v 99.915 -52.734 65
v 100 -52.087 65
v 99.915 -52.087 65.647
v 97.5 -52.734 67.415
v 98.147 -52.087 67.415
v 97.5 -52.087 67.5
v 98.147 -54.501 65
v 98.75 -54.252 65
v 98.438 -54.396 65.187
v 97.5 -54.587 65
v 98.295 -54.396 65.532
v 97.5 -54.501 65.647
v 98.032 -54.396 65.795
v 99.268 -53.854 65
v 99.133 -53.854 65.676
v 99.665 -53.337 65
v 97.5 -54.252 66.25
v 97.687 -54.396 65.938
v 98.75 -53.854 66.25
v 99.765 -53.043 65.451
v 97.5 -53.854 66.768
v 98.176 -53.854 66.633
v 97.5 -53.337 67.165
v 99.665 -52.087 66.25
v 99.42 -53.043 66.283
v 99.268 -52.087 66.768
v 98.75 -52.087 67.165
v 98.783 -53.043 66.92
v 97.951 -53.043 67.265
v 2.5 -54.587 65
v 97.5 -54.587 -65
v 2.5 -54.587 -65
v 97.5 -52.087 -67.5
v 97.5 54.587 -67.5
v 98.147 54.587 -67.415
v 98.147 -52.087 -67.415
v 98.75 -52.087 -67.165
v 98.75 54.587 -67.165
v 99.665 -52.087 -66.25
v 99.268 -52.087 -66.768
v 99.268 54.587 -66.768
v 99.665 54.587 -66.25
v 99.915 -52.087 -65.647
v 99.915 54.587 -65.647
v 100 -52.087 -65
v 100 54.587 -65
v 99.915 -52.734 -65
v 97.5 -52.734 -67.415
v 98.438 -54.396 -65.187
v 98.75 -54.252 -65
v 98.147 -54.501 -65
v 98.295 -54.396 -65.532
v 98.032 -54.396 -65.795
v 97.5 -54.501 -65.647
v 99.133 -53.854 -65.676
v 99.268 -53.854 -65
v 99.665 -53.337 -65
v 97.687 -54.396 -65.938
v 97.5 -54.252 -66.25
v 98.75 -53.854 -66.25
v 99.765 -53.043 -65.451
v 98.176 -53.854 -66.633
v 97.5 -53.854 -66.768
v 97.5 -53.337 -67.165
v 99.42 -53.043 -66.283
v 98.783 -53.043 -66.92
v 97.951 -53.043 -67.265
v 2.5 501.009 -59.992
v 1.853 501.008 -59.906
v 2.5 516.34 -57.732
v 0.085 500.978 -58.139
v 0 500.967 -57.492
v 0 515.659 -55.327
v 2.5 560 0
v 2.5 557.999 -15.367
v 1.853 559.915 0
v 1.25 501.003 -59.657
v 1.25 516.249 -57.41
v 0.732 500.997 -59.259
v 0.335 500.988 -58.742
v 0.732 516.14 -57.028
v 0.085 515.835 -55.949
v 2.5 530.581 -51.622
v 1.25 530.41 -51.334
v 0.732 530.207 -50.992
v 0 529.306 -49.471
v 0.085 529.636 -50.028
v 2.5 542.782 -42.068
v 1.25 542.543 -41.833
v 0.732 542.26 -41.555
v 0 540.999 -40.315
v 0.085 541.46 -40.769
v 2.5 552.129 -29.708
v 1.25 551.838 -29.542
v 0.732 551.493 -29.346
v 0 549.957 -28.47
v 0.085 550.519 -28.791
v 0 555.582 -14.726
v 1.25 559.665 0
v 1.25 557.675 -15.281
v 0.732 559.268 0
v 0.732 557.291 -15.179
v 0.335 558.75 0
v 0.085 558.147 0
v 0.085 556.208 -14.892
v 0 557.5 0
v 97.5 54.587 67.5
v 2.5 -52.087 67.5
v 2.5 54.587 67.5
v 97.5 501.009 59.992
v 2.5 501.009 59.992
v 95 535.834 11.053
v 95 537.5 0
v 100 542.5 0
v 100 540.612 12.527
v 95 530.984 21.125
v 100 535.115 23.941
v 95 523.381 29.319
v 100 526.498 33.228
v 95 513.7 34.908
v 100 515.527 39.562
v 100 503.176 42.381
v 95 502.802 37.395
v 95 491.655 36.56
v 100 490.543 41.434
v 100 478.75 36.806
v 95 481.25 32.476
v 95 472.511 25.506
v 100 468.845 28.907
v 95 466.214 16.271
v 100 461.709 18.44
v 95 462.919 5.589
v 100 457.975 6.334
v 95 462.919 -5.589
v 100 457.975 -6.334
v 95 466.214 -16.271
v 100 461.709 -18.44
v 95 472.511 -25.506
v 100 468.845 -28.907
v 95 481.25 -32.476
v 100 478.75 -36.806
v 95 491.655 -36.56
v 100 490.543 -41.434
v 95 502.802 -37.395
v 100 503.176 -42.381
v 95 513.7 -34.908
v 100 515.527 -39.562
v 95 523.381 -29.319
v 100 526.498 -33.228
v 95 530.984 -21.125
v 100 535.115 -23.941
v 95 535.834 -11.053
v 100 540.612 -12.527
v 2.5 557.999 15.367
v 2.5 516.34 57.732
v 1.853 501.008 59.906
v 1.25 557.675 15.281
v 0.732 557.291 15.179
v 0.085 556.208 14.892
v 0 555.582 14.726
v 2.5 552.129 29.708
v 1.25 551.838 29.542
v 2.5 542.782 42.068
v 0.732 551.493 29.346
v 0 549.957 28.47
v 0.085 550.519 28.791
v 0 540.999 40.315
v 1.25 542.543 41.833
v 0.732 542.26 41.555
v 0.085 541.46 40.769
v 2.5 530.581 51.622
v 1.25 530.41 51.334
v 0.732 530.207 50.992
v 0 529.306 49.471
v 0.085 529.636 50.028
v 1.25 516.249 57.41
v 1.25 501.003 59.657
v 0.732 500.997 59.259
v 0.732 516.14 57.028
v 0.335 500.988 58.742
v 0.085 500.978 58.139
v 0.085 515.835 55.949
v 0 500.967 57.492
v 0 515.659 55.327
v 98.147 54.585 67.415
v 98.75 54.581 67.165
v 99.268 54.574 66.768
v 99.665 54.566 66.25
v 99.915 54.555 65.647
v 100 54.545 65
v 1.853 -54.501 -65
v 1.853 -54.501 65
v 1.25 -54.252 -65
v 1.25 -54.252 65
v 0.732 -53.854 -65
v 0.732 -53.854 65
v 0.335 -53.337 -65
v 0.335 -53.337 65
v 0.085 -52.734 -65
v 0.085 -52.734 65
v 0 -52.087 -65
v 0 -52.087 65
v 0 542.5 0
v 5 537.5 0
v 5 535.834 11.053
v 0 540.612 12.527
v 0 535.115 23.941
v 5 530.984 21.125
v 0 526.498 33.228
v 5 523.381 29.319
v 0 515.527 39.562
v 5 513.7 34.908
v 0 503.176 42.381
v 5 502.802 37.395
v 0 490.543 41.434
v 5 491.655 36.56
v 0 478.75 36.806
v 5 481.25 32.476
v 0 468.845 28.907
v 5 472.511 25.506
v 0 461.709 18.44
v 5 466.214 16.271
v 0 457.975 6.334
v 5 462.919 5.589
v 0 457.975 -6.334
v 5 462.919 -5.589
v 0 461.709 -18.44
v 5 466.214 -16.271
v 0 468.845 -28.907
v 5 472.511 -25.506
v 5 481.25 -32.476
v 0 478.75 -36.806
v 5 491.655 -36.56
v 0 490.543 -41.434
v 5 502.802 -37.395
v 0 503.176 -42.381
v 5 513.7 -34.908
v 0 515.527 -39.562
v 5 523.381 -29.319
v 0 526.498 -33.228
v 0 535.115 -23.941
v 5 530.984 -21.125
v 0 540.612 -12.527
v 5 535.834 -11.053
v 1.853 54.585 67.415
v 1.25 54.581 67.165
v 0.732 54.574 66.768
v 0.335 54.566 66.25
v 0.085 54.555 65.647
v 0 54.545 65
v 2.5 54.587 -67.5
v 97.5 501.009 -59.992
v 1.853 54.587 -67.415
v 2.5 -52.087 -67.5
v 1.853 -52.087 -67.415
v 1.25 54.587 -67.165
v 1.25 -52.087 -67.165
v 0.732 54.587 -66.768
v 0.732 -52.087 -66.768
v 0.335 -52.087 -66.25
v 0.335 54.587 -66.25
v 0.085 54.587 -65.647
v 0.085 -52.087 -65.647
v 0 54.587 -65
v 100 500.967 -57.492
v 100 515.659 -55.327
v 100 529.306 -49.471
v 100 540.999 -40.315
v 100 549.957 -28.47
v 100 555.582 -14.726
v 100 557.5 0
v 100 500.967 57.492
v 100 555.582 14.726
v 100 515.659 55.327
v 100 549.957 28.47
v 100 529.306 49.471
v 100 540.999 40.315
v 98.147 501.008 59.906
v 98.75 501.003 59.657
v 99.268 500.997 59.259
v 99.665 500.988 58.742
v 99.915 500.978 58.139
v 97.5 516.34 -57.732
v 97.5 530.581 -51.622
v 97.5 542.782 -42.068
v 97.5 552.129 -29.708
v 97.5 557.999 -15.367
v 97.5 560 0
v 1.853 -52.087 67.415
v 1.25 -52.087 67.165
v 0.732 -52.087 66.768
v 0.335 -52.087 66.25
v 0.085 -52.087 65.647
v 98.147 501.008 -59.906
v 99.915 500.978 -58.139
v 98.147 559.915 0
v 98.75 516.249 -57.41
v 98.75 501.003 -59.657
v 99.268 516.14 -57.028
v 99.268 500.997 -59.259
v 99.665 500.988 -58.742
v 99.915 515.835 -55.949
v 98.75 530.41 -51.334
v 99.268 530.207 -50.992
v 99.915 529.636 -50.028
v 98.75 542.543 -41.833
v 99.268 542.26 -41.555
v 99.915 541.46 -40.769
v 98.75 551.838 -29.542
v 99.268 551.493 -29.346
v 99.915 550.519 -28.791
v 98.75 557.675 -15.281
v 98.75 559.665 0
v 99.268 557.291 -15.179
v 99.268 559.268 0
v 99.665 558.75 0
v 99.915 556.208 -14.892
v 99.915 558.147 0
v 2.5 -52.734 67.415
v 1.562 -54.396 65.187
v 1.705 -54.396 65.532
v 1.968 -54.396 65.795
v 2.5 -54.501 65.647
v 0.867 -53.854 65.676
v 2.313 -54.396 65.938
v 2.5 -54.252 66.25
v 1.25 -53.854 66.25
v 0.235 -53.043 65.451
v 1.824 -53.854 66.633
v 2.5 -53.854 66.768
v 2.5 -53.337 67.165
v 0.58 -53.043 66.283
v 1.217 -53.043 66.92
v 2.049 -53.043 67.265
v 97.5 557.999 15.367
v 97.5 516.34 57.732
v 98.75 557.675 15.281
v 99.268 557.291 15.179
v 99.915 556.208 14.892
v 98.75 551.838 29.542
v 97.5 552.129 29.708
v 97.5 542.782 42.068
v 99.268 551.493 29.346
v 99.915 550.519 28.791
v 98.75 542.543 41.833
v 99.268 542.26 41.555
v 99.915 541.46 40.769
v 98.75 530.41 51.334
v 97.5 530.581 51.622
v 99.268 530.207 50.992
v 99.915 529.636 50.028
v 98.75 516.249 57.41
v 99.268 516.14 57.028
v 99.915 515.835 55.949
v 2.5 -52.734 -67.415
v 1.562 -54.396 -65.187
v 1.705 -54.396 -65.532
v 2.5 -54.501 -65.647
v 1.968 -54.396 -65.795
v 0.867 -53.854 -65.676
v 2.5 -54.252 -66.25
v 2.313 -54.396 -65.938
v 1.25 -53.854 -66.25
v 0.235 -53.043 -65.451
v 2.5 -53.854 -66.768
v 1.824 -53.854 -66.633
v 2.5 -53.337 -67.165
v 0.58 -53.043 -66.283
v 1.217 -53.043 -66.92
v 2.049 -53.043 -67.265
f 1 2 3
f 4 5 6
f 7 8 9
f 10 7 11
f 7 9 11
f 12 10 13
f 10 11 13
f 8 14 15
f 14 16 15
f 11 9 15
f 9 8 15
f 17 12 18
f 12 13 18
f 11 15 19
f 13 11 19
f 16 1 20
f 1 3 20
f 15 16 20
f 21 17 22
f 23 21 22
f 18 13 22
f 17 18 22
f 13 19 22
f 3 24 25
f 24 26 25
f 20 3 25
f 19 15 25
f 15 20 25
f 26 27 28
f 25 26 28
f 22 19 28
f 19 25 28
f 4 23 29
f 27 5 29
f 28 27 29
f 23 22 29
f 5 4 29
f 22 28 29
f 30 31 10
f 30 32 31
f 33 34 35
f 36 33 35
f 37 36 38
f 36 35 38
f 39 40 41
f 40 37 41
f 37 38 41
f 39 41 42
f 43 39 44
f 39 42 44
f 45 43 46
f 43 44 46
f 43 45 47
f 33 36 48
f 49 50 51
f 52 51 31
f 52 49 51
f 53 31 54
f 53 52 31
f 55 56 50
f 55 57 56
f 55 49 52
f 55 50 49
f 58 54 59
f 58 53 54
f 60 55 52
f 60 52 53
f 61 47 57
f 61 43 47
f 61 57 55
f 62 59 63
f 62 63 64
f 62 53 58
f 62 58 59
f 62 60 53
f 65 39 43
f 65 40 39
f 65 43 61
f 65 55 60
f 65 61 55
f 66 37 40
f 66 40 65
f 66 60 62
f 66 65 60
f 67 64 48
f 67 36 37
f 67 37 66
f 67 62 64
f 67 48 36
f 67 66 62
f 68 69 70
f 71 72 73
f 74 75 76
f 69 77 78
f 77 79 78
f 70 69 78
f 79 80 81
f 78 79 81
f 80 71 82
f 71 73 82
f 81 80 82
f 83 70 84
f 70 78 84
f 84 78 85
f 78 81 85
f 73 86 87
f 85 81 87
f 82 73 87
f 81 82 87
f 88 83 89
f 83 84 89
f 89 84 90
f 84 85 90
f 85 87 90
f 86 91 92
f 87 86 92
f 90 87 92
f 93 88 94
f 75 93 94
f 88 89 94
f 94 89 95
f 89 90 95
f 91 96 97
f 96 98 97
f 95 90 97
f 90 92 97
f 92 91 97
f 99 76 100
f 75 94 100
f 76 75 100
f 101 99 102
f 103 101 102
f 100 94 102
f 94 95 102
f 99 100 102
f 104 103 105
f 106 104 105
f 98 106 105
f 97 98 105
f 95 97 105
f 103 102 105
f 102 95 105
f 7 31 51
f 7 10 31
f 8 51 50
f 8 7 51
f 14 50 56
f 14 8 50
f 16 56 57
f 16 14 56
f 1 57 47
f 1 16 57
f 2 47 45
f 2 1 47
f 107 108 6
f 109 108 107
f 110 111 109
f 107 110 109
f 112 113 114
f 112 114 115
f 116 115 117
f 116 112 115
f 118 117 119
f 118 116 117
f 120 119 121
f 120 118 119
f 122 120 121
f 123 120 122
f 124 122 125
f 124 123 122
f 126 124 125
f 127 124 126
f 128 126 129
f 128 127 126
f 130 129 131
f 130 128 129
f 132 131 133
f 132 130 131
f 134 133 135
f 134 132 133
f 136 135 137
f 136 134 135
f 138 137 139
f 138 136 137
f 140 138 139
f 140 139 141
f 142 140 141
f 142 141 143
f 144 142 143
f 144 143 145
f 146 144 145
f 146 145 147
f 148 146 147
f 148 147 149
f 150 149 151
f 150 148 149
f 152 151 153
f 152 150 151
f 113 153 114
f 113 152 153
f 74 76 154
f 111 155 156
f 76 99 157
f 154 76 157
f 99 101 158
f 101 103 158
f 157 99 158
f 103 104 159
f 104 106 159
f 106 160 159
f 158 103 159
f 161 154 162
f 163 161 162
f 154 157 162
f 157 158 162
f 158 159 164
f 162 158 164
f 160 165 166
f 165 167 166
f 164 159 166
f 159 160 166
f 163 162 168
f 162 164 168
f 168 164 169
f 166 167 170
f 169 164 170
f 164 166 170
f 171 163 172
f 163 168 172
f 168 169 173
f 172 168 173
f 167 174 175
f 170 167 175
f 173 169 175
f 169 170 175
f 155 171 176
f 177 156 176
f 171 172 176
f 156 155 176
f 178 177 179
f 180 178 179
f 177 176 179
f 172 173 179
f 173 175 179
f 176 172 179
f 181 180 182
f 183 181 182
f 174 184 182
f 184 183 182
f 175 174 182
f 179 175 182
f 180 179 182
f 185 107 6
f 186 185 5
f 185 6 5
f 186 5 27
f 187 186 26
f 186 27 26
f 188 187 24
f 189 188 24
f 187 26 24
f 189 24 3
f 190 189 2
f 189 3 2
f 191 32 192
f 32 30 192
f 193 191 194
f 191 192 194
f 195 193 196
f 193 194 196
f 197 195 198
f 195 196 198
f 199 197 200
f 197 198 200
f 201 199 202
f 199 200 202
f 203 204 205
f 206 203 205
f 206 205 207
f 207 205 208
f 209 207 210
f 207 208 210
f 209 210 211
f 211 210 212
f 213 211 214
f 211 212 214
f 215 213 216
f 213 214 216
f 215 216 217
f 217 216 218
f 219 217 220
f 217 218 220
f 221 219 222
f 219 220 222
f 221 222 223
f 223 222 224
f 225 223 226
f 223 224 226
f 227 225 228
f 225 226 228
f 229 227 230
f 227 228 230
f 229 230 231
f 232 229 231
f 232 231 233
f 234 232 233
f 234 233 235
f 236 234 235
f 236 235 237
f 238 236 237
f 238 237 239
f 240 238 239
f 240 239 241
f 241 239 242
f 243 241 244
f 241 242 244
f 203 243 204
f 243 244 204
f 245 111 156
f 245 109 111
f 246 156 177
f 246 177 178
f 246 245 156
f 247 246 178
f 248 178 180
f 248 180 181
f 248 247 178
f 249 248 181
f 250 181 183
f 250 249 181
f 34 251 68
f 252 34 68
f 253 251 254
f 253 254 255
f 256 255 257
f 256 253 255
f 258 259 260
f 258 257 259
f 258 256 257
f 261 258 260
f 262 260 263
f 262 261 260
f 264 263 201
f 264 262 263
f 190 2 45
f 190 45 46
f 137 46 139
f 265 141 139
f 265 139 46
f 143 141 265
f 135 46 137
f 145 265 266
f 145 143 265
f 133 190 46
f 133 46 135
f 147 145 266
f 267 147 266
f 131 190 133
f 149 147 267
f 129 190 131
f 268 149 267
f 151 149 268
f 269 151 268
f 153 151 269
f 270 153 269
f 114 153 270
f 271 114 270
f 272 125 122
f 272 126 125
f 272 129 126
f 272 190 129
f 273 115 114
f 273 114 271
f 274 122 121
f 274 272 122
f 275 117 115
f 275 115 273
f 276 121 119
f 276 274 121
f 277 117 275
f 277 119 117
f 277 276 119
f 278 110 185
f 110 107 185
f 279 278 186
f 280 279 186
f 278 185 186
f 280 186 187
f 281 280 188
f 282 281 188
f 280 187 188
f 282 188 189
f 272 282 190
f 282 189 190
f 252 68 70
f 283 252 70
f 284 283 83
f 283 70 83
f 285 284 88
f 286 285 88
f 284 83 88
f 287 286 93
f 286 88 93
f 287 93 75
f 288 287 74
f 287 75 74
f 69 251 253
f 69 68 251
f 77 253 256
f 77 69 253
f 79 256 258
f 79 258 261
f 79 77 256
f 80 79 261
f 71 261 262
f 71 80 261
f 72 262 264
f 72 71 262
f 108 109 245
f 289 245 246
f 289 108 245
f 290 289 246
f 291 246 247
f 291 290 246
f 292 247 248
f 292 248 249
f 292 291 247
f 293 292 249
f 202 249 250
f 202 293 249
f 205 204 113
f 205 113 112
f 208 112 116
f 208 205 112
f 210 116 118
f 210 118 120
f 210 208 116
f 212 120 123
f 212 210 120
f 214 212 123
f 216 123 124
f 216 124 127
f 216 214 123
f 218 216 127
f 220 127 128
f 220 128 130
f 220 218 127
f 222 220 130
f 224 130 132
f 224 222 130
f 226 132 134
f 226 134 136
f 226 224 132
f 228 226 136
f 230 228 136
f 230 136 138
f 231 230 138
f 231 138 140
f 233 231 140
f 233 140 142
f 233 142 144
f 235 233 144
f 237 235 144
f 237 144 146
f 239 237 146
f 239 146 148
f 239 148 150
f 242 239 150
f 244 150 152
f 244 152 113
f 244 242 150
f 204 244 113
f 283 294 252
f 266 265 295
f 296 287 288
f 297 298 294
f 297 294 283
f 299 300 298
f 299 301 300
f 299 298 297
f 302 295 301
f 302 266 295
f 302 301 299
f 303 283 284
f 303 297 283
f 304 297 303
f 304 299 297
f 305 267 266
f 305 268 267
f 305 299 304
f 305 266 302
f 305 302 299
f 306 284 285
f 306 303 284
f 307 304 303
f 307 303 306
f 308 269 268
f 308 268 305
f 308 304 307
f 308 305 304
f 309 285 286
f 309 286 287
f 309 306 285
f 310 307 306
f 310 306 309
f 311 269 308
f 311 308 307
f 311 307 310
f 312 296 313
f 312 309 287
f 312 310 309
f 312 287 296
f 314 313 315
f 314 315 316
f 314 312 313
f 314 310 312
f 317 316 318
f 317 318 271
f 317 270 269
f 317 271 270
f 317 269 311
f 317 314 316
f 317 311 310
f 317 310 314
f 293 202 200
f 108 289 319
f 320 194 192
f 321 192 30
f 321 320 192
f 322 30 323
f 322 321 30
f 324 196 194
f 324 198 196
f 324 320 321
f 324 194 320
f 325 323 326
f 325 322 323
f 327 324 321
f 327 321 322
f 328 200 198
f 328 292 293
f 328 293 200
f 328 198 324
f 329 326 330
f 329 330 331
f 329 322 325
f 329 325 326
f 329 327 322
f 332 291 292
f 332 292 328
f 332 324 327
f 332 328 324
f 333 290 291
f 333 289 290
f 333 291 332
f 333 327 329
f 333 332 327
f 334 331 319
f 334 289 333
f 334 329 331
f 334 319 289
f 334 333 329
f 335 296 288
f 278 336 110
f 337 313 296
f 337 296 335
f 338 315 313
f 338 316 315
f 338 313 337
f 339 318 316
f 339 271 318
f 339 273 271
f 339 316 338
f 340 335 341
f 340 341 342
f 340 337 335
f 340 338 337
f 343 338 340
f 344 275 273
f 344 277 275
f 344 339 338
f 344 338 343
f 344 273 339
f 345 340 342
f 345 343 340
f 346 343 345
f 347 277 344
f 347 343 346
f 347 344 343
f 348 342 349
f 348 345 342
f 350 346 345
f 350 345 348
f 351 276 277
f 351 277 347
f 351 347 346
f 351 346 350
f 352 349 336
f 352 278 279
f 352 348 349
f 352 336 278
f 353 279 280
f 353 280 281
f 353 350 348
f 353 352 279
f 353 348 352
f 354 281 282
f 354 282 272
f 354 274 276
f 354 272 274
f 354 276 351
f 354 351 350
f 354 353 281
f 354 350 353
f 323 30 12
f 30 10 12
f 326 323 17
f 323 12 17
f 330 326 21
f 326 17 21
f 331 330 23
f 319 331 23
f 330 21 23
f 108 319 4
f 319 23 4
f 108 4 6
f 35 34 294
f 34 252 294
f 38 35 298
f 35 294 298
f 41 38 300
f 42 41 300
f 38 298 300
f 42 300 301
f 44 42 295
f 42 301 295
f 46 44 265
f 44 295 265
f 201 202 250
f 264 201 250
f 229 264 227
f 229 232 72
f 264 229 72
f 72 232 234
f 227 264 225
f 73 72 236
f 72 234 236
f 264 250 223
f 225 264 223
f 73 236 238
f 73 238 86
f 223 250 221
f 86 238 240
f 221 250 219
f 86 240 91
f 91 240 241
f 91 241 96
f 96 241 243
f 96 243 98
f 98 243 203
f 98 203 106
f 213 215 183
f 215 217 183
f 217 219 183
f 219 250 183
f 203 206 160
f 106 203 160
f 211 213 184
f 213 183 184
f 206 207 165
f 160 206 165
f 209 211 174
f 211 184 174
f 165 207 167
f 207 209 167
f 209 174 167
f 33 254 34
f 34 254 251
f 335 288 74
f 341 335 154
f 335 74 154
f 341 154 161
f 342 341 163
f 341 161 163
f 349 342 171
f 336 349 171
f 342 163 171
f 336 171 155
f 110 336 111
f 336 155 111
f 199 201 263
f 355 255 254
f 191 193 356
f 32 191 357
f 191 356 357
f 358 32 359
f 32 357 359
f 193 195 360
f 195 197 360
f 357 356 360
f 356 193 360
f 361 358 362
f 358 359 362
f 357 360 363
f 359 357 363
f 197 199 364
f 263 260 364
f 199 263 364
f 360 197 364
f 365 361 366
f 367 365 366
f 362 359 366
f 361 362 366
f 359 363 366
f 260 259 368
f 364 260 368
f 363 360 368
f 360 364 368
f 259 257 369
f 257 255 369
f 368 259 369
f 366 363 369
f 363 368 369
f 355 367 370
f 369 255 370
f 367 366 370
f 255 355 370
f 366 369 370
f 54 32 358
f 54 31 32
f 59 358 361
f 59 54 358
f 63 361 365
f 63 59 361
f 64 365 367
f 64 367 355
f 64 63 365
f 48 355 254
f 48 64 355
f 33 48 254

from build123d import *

# Parameters (mm, degrees)
F0_W     = 109.173186
F0_H     = 135
F0_R     = 37.5
F1_DEPTH = 100
F2_R     = 2.5
F3_SIZE  = 5


with BuildPart() as f1:
    # F0 (on Right) → F1 (new body)
    with BuildSketch(Plane.YZ):
        Rectangle(F0_W, F0_H)
        with BuildLine():
            Line((501.009012, 59.991515), (54.586593, 67.5))
            Line((54.586593, 67.5), (54.586593, -67.5))
            Line((54.586593, -67.5), (501.009012, -59.991515))
            ThreePointArc((501.009012, -59.991515), (440, 0), (501.009012, 59.991515))
        make_face()
        with BuildLine():
            ThreePointArc((560, 0), (542.781659, 42.068155), (501.009012, 59.991515))
            ThreePointArc((501.009012, 59.991515), (440, 0), (501.009012, -59.991515))
            ThreePointArc((501.009012, -59.991515), (542.781659, -42.068155), (560, 0))
        make_face()
        with Locations((500, 0)):
            Circle(F0_R, mode=Mode.SUBTRACT)
    extrude(amount=F1_DEPTH)

    # F2
    f2_edges = [f1.edges().sort_by_distance(p)[0] for p in [
        (100, 277.797802, 63.745758),
        (100, 277.797802, -63.745758),
        (100, 0, -67.5),
        (100, -54.586593, 0),
        (100, 0, 67.5),
        (100, 560, 0),
        (0, 277.797802, 63.745758),
        (0, 560, 0),
        (0, 277.797802, -63.745758),
        (0, 0, -67.5),
        (0, -54.586593, 0),
        (0, 0, 67.5),
        (50, -54.586593, -67.5),
        (50, -54.586593, 67.5),
    ]]
    fillet(f2_edges, radius=F2_R)

    # F3
    f3_edges = [f1.edges().sort_by_distance(p)[0] for p in [
        (100, 462.5, 0),
        (0, 462.5, 0),
    ]]
    chamfer(f3_edges, length=F3_SIZE)


solid = f1.part
